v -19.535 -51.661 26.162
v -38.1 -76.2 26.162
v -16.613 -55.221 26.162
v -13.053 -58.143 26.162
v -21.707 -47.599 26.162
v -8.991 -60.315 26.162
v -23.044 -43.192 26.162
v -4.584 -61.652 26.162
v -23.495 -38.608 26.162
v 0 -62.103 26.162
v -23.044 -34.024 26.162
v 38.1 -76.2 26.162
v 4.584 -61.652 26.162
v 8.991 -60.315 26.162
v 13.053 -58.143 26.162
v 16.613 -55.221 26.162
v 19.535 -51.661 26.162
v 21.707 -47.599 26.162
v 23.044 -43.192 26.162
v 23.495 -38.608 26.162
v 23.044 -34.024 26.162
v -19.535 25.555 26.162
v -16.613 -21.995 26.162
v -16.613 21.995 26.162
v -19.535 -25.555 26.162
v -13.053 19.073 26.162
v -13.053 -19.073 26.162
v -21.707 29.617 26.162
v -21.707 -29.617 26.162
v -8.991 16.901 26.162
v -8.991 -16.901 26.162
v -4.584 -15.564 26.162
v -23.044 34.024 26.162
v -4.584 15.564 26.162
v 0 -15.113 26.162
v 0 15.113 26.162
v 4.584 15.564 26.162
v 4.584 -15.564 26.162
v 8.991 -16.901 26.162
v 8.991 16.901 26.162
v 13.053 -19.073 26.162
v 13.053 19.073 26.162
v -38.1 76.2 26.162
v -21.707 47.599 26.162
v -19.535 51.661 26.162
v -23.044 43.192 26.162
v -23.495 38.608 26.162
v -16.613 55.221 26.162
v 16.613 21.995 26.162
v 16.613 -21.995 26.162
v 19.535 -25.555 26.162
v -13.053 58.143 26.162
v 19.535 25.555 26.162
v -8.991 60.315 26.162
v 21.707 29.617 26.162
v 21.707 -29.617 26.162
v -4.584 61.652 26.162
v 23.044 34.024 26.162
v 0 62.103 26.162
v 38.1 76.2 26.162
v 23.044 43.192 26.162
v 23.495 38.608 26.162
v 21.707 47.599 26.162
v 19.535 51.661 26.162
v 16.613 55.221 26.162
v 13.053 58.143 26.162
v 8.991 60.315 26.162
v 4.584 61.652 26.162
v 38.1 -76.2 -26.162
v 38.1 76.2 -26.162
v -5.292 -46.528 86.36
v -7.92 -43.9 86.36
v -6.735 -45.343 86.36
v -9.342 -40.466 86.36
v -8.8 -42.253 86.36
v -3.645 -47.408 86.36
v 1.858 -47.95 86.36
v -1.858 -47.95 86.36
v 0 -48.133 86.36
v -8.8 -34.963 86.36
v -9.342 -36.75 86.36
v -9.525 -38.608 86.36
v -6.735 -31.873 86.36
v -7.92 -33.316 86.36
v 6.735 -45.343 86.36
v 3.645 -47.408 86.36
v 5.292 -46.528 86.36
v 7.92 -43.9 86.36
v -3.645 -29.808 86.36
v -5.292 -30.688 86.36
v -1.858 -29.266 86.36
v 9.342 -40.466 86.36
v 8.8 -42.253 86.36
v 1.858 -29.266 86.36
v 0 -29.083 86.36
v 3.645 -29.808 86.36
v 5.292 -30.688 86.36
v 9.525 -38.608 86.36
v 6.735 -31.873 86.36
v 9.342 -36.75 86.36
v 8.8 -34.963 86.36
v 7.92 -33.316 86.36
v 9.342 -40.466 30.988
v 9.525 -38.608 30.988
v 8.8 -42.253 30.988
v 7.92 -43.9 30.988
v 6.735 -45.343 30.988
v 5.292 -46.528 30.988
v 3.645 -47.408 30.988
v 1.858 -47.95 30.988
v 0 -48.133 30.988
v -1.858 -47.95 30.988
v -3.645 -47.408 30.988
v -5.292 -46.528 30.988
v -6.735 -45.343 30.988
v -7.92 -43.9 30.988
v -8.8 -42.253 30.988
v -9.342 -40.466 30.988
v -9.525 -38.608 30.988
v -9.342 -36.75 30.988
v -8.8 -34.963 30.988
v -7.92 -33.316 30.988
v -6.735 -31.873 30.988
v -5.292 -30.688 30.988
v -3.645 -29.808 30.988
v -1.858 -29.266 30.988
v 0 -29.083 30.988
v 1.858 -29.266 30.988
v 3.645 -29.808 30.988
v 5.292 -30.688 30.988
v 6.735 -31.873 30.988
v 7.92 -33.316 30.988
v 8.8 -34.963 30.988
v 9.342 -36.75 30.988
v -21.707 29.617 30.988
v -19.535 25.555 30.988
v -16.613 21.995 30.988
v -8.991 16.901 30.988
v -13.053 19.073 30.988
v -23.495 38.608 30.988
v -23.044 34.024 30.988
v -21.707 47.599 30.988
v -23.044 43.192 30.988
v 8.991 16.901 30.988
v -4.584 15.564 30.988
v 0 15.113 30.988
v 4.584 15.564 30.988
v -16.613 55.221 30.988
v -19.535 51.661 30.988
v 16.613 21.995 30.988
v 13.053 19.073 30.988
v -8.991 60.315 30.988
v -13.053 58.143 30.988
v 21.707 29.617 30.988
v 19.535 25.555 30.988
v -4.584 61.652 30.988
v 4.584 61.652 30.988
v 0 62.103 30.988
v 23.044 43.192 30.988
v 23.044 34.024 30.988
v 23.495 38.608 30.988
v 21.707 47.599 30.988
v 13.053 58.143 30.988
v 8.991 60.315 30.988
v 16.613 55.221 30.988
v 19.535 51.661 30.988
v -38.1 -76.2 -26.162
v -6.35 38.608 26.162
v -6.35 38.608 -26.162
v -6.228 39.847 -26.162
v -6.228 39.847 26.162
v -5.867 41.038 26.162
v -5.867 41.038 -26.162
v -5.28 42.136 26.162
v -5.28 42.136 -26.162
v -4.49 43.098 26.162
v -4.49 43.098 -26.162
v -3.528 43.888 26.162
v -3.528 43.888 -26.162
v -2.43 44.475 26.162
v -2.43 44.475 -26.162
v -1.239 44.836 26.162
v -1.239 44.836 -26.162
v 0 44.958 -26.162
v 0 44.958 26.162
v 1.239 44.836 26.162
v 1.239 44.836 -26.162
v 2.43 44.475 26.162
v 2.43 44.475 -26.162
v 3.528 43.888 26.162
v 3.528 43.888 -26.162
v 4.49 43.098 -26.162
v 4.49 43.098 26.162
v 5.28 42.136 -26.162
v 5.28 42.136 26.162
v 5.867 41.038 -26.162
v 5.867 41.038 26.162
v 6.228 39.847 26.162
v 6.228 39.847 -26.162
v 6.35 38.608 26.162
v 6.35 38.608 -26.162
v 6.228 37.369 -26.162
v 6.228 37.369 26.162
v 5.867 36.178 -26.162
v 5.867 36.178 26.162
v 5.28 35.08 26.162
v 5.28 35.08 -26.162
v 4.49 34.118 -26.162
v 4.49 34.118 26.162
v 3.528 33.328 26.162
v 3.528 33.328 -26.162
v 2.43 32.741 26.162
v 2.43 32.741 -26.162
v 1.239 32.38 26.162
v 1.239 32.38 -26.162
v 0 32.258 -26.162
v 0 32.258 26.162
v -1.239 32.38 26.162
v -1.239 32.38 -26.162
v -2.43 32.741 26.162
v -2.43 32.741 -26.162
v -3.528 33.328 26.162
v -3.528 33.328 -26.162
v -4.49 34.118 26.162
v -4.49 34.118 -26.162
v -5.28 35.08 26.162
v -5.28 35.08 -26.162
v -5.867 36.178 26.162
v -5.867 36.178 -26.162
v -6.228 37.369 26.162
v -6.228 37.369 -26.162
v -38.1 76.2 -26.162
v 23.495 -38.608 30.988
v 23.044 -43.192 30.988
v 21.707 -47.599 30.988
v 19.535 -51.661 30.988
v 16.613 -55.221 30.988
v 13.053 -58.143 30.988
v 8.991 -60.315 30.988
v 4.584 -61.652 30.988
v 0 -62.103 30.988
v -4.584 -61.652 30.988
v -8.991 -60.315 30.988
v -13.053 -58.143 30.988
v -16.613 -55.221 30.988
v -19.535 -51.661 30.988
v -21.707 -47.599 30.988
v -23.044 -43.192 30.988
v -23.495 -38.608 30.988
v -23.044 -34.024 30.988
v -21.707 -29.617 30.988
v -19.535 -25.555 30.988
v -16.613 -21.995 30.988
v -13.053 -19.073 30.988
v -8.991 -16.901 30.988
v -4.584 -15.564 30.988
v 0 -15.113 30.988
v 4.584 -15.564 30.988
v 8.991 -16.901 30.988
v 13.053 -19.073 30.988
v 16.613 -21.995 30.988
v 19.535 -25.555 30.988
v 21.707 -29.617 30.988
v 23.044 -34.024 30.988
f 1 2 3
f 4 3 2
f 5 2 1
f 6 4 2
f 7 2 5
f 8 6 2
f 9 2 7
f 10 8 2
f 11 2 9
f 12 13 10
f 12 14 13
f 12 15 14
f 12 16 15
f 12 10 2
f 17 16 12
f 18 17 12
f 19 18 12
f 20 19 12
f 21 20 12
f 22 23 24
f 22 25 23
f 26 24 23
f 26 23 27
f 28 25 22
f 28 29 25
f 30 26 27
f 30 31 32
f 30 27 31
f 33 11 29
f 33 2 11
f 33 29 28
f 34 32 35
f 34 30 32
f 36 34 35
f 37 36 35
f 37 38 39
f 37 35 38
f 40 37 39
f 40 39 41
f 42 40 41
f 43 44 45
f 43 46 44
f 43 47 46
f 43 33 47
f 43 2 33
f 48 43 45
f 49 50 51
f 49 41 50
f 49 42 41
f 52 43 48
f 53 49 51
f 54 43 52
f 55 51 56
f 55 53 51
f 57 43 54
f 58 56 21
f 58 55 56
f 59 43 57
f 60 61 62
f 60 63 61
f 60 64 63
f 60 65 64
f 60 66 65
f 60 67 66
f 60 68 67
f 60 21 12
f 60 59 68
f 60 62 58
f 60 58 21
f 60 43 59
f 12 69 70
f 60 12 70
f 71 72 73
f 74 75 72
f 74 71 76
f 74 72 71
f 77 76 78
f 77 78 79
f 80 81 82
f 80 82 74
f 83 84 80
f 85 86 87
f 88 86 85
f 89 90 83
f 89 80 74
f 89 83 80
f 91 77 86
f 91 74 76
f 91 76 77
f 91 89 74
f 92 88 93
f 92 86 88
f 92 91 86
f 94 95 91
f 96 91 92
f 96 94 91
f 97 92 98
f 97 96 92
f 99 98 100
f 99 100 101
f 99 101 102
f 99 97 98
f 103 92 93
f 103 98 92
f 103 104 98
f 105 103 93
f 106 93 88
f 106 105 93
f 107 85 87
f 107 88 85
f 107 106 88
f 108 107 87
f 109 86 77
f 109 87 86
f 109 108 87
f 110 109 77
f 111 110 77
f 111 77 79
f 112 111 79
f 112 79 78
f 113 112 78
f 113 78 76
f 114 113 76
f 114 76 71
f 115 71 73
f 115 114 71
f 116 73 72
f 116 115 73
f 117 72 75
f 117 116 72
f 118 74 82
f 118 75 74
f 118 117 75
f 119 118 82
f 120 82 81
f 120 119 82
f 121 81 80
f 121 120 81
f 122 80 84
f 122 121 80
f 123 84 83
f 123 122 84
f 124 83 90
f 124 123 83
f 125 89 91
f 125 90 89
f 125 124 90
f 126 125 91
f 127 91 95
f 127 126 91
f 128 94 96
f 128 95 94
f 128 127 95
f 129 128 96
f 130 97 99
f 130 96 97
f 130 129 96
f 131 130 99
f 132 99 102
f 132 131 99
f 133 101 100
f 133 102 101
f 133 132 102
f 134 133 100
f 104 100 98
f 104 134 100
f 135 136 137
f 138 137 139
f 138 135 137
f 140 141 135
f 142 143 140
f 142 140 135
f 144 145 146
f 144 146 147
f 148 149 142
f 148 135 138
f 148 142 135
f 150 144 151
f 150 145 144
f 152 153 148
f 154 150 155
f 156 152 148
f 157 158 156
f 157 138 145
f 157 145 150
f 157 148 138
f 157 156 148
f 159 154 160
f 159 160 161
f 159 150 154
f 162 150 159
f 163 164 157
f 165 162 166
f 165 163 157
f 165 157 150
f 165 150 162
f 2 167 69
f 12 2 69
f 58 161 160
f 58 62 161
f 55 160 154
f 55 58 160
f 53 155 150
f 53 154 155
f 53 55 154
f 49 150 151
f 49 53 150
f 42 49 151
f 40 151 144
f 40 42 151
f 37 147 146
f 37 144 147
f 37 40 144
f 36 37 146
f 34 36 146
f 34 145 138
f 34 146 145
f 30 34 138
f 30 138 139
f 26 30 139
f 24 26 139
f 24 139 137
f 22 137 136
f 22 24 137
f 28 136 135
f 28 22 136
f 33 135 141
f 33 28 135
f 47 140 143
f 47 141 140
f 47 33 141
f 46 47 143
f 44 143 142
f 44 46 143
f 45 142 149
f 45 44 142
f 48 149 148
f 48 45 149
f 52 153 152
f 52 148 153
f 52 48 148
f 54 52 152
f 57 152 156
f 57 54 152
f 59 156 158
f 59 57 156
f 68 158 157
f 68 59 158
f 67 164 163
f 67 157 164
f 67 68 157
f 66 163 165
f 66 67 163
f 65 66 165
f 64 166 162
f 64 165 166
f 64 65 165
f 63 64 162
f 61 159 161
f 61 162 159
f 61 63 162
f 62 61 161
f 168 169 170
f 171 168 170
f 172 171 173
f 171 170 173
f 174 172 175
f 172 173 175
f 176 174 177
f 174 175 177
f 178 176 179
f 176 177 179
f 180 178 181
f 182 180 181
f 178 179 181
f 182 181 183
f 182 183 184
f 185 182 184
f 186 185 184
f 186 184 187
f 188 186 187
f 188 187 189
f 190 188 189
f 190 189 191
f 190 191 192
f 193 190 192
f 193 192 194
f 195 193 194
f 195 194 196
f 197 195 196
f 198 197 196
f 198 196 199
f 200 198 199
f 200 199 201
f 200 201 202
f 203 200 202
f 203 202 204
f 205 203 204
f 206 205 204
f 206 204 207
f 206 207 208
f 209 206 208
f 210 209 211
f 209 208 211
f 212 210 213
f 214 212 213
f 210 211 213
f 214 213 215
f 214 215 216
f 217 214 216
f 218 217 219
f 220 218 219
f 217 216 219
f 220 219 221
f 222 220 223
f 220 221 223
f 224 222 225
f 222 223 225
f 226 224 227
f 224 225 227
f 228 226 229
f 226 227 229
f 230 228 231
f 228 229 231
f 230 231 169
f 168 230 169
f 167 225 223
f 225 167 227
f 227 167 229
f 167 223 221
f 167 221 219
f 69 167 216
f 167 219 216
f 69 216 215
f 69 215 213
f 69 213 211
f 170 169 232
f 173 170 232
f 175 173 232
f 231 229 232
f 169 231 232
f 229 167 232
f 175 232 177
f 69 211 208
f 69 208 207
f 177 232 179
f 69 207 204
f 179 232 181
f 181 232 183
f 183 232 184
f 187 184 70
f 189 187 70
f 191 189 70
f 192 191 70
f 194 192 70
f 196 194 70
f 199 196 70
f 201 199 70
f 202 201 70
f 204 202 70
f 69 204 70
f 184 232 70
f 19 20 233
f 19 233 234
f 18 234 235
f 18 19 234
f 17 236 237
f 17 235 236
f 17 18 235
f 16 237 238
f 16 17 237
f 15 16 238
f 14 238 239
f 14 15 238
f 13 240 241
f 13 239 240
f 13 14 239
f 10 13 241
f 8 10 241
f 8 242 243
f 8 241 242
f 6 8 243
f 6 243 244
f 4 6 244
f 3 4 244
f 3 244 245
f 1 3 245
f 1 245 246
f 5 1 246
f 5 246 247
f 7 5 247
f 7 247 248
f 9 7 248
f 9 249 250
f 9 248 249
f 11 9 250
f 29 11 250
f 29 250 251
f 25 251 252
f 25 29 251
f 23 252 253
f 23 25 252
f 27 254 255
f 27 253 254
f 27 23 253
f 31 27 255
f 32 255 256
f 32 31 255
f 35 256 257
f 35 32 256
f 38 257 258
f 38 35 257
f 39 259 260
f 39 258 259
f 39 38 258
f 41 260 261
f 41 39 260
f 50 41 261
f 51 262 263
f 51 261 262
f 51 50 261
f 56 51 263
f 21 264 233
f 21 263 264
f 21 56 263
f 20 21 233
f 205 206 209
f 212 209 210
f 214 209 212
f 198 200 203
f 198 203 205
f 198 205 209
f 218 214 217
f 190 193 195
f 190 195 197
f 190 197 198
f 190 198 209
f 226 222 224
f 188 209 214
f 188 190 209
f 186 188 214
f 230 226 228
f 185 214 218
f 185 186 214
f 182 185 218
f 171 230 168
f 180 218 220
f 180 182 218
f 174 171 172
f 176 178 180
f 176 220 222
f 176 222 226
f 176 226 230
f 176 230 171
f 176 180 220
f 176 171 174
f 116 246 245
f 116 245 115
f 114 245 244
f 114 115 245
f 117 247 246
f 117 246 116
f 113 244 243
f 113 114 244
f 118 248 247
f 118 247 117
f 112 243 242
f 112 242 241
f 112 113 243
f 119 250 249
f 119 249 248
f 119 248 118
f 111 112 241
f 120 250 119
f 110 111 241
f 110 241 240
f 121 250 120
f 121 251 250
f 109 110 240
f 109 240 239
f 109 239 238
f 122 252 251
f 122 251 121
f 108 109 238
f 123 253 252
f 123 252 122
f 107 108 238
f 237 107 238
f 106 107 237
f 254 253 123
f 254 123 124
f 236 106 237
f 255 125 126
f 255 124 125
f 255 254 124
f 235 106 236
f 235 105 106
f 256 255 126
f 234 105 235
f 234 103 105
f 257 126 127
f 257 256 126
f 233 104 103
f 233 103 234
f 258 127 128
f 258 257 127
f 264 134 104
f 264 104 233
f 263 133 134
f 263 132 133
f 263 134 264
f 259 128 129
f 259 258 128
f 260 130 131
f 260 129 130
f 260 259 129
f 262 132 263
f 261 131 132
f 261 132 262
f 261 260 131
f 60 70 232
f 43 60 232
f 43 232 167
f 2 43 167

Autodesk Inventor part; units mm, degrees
ref_plane "XZ Plane" through (0, 0, 0) normal (0, 1, 0) x (-1, 0, 0)
ref_plane "XY Plane" through (0, 0, 0) normal (0, 0, 1) x (1, 0, 0)
sketch "Sketch1" plane through (0, 0, 0) normal (0, 0, 1) x (1, 0, 0)
  line L0 (-38.1, -76.2) -> (38.1, -76.2)
  line L1 (38.1, -76.2) -> (38.1, 76.2)
  line L2 (38.1, 76.2) -> (-38.1, 76.2)
  line L3 (-38.1, 76.2) -> (-38.1, -76.2)
  line L4 (-38.1, -76.2) -> (38.1, 76.2) construction
  line L5 (38.1, -76.2) -> (-38.1, 76.2) construction
  point P0 (0, 0)
  dimension "d0" = 76.2
  dimension "d1" = 152.4
extrude "Extrusion1" add sketch "Sketch1" along normal mid plane 52.324
sketch "Sketch2" plane through (0, 0, 26.162) normal (0, 0, 1) x (1, 0, 0)
  line L0 (-38.1, -76.2) -> (38.1, -76.2) projected
  line L1 (38.1, -76.2) -> (38.1, 76.2) projected
  line L2 (38.1, 76.2) -> (-38.1, 76.2) projected
  line L3 (-38.1, 76.2) -> (-38.1, -76.2) projected
  circle A0 centre (0, 38.608) radius 23.495
  line L4 (-46.8851, 0) -> (67.5058, 0) construction
  circle A1 centre (0, -38.608) radius 23.495
  point P0 (0, 0)
  dimension "d4" = 46.99
  dimension "d8" = 38.608
extrude "Extrusion3" add sketch "Sketch2" along normal blind 4.826 contours A0 | A1
sketch "Sketch4" plane through (0, -38.608, 30.988) normal (0, 0, 1) x (1, 0, 0)
  circle A0 centre (0, 0) radius 23.495 projected
  circle A1 centre (0, 0) radius 9.525
  point P0 (0, 38.608)
  dimension "d11" = 19.05
extrude "Extrusion4" add sketch "Sketch4" along normal blind 55.372 contours A1
sketch "Sketch5" plane through (0, 0, -26.162) normal (0, 0, -1) x (-1, 0, 0)
  circle A0 centre (0, 38.608) radius 23.495 projected
  circle A1 centre (0, 38.608) radius 6.35
  point P0 (0, 0)
  dimension "d14" = 12.7
extrude "Extrusion5" cut sketch "Sketch5" against normal blind 52.324 contours A1
properties part number "A28-400-G Gearbox" material "Aluminum 6061"
